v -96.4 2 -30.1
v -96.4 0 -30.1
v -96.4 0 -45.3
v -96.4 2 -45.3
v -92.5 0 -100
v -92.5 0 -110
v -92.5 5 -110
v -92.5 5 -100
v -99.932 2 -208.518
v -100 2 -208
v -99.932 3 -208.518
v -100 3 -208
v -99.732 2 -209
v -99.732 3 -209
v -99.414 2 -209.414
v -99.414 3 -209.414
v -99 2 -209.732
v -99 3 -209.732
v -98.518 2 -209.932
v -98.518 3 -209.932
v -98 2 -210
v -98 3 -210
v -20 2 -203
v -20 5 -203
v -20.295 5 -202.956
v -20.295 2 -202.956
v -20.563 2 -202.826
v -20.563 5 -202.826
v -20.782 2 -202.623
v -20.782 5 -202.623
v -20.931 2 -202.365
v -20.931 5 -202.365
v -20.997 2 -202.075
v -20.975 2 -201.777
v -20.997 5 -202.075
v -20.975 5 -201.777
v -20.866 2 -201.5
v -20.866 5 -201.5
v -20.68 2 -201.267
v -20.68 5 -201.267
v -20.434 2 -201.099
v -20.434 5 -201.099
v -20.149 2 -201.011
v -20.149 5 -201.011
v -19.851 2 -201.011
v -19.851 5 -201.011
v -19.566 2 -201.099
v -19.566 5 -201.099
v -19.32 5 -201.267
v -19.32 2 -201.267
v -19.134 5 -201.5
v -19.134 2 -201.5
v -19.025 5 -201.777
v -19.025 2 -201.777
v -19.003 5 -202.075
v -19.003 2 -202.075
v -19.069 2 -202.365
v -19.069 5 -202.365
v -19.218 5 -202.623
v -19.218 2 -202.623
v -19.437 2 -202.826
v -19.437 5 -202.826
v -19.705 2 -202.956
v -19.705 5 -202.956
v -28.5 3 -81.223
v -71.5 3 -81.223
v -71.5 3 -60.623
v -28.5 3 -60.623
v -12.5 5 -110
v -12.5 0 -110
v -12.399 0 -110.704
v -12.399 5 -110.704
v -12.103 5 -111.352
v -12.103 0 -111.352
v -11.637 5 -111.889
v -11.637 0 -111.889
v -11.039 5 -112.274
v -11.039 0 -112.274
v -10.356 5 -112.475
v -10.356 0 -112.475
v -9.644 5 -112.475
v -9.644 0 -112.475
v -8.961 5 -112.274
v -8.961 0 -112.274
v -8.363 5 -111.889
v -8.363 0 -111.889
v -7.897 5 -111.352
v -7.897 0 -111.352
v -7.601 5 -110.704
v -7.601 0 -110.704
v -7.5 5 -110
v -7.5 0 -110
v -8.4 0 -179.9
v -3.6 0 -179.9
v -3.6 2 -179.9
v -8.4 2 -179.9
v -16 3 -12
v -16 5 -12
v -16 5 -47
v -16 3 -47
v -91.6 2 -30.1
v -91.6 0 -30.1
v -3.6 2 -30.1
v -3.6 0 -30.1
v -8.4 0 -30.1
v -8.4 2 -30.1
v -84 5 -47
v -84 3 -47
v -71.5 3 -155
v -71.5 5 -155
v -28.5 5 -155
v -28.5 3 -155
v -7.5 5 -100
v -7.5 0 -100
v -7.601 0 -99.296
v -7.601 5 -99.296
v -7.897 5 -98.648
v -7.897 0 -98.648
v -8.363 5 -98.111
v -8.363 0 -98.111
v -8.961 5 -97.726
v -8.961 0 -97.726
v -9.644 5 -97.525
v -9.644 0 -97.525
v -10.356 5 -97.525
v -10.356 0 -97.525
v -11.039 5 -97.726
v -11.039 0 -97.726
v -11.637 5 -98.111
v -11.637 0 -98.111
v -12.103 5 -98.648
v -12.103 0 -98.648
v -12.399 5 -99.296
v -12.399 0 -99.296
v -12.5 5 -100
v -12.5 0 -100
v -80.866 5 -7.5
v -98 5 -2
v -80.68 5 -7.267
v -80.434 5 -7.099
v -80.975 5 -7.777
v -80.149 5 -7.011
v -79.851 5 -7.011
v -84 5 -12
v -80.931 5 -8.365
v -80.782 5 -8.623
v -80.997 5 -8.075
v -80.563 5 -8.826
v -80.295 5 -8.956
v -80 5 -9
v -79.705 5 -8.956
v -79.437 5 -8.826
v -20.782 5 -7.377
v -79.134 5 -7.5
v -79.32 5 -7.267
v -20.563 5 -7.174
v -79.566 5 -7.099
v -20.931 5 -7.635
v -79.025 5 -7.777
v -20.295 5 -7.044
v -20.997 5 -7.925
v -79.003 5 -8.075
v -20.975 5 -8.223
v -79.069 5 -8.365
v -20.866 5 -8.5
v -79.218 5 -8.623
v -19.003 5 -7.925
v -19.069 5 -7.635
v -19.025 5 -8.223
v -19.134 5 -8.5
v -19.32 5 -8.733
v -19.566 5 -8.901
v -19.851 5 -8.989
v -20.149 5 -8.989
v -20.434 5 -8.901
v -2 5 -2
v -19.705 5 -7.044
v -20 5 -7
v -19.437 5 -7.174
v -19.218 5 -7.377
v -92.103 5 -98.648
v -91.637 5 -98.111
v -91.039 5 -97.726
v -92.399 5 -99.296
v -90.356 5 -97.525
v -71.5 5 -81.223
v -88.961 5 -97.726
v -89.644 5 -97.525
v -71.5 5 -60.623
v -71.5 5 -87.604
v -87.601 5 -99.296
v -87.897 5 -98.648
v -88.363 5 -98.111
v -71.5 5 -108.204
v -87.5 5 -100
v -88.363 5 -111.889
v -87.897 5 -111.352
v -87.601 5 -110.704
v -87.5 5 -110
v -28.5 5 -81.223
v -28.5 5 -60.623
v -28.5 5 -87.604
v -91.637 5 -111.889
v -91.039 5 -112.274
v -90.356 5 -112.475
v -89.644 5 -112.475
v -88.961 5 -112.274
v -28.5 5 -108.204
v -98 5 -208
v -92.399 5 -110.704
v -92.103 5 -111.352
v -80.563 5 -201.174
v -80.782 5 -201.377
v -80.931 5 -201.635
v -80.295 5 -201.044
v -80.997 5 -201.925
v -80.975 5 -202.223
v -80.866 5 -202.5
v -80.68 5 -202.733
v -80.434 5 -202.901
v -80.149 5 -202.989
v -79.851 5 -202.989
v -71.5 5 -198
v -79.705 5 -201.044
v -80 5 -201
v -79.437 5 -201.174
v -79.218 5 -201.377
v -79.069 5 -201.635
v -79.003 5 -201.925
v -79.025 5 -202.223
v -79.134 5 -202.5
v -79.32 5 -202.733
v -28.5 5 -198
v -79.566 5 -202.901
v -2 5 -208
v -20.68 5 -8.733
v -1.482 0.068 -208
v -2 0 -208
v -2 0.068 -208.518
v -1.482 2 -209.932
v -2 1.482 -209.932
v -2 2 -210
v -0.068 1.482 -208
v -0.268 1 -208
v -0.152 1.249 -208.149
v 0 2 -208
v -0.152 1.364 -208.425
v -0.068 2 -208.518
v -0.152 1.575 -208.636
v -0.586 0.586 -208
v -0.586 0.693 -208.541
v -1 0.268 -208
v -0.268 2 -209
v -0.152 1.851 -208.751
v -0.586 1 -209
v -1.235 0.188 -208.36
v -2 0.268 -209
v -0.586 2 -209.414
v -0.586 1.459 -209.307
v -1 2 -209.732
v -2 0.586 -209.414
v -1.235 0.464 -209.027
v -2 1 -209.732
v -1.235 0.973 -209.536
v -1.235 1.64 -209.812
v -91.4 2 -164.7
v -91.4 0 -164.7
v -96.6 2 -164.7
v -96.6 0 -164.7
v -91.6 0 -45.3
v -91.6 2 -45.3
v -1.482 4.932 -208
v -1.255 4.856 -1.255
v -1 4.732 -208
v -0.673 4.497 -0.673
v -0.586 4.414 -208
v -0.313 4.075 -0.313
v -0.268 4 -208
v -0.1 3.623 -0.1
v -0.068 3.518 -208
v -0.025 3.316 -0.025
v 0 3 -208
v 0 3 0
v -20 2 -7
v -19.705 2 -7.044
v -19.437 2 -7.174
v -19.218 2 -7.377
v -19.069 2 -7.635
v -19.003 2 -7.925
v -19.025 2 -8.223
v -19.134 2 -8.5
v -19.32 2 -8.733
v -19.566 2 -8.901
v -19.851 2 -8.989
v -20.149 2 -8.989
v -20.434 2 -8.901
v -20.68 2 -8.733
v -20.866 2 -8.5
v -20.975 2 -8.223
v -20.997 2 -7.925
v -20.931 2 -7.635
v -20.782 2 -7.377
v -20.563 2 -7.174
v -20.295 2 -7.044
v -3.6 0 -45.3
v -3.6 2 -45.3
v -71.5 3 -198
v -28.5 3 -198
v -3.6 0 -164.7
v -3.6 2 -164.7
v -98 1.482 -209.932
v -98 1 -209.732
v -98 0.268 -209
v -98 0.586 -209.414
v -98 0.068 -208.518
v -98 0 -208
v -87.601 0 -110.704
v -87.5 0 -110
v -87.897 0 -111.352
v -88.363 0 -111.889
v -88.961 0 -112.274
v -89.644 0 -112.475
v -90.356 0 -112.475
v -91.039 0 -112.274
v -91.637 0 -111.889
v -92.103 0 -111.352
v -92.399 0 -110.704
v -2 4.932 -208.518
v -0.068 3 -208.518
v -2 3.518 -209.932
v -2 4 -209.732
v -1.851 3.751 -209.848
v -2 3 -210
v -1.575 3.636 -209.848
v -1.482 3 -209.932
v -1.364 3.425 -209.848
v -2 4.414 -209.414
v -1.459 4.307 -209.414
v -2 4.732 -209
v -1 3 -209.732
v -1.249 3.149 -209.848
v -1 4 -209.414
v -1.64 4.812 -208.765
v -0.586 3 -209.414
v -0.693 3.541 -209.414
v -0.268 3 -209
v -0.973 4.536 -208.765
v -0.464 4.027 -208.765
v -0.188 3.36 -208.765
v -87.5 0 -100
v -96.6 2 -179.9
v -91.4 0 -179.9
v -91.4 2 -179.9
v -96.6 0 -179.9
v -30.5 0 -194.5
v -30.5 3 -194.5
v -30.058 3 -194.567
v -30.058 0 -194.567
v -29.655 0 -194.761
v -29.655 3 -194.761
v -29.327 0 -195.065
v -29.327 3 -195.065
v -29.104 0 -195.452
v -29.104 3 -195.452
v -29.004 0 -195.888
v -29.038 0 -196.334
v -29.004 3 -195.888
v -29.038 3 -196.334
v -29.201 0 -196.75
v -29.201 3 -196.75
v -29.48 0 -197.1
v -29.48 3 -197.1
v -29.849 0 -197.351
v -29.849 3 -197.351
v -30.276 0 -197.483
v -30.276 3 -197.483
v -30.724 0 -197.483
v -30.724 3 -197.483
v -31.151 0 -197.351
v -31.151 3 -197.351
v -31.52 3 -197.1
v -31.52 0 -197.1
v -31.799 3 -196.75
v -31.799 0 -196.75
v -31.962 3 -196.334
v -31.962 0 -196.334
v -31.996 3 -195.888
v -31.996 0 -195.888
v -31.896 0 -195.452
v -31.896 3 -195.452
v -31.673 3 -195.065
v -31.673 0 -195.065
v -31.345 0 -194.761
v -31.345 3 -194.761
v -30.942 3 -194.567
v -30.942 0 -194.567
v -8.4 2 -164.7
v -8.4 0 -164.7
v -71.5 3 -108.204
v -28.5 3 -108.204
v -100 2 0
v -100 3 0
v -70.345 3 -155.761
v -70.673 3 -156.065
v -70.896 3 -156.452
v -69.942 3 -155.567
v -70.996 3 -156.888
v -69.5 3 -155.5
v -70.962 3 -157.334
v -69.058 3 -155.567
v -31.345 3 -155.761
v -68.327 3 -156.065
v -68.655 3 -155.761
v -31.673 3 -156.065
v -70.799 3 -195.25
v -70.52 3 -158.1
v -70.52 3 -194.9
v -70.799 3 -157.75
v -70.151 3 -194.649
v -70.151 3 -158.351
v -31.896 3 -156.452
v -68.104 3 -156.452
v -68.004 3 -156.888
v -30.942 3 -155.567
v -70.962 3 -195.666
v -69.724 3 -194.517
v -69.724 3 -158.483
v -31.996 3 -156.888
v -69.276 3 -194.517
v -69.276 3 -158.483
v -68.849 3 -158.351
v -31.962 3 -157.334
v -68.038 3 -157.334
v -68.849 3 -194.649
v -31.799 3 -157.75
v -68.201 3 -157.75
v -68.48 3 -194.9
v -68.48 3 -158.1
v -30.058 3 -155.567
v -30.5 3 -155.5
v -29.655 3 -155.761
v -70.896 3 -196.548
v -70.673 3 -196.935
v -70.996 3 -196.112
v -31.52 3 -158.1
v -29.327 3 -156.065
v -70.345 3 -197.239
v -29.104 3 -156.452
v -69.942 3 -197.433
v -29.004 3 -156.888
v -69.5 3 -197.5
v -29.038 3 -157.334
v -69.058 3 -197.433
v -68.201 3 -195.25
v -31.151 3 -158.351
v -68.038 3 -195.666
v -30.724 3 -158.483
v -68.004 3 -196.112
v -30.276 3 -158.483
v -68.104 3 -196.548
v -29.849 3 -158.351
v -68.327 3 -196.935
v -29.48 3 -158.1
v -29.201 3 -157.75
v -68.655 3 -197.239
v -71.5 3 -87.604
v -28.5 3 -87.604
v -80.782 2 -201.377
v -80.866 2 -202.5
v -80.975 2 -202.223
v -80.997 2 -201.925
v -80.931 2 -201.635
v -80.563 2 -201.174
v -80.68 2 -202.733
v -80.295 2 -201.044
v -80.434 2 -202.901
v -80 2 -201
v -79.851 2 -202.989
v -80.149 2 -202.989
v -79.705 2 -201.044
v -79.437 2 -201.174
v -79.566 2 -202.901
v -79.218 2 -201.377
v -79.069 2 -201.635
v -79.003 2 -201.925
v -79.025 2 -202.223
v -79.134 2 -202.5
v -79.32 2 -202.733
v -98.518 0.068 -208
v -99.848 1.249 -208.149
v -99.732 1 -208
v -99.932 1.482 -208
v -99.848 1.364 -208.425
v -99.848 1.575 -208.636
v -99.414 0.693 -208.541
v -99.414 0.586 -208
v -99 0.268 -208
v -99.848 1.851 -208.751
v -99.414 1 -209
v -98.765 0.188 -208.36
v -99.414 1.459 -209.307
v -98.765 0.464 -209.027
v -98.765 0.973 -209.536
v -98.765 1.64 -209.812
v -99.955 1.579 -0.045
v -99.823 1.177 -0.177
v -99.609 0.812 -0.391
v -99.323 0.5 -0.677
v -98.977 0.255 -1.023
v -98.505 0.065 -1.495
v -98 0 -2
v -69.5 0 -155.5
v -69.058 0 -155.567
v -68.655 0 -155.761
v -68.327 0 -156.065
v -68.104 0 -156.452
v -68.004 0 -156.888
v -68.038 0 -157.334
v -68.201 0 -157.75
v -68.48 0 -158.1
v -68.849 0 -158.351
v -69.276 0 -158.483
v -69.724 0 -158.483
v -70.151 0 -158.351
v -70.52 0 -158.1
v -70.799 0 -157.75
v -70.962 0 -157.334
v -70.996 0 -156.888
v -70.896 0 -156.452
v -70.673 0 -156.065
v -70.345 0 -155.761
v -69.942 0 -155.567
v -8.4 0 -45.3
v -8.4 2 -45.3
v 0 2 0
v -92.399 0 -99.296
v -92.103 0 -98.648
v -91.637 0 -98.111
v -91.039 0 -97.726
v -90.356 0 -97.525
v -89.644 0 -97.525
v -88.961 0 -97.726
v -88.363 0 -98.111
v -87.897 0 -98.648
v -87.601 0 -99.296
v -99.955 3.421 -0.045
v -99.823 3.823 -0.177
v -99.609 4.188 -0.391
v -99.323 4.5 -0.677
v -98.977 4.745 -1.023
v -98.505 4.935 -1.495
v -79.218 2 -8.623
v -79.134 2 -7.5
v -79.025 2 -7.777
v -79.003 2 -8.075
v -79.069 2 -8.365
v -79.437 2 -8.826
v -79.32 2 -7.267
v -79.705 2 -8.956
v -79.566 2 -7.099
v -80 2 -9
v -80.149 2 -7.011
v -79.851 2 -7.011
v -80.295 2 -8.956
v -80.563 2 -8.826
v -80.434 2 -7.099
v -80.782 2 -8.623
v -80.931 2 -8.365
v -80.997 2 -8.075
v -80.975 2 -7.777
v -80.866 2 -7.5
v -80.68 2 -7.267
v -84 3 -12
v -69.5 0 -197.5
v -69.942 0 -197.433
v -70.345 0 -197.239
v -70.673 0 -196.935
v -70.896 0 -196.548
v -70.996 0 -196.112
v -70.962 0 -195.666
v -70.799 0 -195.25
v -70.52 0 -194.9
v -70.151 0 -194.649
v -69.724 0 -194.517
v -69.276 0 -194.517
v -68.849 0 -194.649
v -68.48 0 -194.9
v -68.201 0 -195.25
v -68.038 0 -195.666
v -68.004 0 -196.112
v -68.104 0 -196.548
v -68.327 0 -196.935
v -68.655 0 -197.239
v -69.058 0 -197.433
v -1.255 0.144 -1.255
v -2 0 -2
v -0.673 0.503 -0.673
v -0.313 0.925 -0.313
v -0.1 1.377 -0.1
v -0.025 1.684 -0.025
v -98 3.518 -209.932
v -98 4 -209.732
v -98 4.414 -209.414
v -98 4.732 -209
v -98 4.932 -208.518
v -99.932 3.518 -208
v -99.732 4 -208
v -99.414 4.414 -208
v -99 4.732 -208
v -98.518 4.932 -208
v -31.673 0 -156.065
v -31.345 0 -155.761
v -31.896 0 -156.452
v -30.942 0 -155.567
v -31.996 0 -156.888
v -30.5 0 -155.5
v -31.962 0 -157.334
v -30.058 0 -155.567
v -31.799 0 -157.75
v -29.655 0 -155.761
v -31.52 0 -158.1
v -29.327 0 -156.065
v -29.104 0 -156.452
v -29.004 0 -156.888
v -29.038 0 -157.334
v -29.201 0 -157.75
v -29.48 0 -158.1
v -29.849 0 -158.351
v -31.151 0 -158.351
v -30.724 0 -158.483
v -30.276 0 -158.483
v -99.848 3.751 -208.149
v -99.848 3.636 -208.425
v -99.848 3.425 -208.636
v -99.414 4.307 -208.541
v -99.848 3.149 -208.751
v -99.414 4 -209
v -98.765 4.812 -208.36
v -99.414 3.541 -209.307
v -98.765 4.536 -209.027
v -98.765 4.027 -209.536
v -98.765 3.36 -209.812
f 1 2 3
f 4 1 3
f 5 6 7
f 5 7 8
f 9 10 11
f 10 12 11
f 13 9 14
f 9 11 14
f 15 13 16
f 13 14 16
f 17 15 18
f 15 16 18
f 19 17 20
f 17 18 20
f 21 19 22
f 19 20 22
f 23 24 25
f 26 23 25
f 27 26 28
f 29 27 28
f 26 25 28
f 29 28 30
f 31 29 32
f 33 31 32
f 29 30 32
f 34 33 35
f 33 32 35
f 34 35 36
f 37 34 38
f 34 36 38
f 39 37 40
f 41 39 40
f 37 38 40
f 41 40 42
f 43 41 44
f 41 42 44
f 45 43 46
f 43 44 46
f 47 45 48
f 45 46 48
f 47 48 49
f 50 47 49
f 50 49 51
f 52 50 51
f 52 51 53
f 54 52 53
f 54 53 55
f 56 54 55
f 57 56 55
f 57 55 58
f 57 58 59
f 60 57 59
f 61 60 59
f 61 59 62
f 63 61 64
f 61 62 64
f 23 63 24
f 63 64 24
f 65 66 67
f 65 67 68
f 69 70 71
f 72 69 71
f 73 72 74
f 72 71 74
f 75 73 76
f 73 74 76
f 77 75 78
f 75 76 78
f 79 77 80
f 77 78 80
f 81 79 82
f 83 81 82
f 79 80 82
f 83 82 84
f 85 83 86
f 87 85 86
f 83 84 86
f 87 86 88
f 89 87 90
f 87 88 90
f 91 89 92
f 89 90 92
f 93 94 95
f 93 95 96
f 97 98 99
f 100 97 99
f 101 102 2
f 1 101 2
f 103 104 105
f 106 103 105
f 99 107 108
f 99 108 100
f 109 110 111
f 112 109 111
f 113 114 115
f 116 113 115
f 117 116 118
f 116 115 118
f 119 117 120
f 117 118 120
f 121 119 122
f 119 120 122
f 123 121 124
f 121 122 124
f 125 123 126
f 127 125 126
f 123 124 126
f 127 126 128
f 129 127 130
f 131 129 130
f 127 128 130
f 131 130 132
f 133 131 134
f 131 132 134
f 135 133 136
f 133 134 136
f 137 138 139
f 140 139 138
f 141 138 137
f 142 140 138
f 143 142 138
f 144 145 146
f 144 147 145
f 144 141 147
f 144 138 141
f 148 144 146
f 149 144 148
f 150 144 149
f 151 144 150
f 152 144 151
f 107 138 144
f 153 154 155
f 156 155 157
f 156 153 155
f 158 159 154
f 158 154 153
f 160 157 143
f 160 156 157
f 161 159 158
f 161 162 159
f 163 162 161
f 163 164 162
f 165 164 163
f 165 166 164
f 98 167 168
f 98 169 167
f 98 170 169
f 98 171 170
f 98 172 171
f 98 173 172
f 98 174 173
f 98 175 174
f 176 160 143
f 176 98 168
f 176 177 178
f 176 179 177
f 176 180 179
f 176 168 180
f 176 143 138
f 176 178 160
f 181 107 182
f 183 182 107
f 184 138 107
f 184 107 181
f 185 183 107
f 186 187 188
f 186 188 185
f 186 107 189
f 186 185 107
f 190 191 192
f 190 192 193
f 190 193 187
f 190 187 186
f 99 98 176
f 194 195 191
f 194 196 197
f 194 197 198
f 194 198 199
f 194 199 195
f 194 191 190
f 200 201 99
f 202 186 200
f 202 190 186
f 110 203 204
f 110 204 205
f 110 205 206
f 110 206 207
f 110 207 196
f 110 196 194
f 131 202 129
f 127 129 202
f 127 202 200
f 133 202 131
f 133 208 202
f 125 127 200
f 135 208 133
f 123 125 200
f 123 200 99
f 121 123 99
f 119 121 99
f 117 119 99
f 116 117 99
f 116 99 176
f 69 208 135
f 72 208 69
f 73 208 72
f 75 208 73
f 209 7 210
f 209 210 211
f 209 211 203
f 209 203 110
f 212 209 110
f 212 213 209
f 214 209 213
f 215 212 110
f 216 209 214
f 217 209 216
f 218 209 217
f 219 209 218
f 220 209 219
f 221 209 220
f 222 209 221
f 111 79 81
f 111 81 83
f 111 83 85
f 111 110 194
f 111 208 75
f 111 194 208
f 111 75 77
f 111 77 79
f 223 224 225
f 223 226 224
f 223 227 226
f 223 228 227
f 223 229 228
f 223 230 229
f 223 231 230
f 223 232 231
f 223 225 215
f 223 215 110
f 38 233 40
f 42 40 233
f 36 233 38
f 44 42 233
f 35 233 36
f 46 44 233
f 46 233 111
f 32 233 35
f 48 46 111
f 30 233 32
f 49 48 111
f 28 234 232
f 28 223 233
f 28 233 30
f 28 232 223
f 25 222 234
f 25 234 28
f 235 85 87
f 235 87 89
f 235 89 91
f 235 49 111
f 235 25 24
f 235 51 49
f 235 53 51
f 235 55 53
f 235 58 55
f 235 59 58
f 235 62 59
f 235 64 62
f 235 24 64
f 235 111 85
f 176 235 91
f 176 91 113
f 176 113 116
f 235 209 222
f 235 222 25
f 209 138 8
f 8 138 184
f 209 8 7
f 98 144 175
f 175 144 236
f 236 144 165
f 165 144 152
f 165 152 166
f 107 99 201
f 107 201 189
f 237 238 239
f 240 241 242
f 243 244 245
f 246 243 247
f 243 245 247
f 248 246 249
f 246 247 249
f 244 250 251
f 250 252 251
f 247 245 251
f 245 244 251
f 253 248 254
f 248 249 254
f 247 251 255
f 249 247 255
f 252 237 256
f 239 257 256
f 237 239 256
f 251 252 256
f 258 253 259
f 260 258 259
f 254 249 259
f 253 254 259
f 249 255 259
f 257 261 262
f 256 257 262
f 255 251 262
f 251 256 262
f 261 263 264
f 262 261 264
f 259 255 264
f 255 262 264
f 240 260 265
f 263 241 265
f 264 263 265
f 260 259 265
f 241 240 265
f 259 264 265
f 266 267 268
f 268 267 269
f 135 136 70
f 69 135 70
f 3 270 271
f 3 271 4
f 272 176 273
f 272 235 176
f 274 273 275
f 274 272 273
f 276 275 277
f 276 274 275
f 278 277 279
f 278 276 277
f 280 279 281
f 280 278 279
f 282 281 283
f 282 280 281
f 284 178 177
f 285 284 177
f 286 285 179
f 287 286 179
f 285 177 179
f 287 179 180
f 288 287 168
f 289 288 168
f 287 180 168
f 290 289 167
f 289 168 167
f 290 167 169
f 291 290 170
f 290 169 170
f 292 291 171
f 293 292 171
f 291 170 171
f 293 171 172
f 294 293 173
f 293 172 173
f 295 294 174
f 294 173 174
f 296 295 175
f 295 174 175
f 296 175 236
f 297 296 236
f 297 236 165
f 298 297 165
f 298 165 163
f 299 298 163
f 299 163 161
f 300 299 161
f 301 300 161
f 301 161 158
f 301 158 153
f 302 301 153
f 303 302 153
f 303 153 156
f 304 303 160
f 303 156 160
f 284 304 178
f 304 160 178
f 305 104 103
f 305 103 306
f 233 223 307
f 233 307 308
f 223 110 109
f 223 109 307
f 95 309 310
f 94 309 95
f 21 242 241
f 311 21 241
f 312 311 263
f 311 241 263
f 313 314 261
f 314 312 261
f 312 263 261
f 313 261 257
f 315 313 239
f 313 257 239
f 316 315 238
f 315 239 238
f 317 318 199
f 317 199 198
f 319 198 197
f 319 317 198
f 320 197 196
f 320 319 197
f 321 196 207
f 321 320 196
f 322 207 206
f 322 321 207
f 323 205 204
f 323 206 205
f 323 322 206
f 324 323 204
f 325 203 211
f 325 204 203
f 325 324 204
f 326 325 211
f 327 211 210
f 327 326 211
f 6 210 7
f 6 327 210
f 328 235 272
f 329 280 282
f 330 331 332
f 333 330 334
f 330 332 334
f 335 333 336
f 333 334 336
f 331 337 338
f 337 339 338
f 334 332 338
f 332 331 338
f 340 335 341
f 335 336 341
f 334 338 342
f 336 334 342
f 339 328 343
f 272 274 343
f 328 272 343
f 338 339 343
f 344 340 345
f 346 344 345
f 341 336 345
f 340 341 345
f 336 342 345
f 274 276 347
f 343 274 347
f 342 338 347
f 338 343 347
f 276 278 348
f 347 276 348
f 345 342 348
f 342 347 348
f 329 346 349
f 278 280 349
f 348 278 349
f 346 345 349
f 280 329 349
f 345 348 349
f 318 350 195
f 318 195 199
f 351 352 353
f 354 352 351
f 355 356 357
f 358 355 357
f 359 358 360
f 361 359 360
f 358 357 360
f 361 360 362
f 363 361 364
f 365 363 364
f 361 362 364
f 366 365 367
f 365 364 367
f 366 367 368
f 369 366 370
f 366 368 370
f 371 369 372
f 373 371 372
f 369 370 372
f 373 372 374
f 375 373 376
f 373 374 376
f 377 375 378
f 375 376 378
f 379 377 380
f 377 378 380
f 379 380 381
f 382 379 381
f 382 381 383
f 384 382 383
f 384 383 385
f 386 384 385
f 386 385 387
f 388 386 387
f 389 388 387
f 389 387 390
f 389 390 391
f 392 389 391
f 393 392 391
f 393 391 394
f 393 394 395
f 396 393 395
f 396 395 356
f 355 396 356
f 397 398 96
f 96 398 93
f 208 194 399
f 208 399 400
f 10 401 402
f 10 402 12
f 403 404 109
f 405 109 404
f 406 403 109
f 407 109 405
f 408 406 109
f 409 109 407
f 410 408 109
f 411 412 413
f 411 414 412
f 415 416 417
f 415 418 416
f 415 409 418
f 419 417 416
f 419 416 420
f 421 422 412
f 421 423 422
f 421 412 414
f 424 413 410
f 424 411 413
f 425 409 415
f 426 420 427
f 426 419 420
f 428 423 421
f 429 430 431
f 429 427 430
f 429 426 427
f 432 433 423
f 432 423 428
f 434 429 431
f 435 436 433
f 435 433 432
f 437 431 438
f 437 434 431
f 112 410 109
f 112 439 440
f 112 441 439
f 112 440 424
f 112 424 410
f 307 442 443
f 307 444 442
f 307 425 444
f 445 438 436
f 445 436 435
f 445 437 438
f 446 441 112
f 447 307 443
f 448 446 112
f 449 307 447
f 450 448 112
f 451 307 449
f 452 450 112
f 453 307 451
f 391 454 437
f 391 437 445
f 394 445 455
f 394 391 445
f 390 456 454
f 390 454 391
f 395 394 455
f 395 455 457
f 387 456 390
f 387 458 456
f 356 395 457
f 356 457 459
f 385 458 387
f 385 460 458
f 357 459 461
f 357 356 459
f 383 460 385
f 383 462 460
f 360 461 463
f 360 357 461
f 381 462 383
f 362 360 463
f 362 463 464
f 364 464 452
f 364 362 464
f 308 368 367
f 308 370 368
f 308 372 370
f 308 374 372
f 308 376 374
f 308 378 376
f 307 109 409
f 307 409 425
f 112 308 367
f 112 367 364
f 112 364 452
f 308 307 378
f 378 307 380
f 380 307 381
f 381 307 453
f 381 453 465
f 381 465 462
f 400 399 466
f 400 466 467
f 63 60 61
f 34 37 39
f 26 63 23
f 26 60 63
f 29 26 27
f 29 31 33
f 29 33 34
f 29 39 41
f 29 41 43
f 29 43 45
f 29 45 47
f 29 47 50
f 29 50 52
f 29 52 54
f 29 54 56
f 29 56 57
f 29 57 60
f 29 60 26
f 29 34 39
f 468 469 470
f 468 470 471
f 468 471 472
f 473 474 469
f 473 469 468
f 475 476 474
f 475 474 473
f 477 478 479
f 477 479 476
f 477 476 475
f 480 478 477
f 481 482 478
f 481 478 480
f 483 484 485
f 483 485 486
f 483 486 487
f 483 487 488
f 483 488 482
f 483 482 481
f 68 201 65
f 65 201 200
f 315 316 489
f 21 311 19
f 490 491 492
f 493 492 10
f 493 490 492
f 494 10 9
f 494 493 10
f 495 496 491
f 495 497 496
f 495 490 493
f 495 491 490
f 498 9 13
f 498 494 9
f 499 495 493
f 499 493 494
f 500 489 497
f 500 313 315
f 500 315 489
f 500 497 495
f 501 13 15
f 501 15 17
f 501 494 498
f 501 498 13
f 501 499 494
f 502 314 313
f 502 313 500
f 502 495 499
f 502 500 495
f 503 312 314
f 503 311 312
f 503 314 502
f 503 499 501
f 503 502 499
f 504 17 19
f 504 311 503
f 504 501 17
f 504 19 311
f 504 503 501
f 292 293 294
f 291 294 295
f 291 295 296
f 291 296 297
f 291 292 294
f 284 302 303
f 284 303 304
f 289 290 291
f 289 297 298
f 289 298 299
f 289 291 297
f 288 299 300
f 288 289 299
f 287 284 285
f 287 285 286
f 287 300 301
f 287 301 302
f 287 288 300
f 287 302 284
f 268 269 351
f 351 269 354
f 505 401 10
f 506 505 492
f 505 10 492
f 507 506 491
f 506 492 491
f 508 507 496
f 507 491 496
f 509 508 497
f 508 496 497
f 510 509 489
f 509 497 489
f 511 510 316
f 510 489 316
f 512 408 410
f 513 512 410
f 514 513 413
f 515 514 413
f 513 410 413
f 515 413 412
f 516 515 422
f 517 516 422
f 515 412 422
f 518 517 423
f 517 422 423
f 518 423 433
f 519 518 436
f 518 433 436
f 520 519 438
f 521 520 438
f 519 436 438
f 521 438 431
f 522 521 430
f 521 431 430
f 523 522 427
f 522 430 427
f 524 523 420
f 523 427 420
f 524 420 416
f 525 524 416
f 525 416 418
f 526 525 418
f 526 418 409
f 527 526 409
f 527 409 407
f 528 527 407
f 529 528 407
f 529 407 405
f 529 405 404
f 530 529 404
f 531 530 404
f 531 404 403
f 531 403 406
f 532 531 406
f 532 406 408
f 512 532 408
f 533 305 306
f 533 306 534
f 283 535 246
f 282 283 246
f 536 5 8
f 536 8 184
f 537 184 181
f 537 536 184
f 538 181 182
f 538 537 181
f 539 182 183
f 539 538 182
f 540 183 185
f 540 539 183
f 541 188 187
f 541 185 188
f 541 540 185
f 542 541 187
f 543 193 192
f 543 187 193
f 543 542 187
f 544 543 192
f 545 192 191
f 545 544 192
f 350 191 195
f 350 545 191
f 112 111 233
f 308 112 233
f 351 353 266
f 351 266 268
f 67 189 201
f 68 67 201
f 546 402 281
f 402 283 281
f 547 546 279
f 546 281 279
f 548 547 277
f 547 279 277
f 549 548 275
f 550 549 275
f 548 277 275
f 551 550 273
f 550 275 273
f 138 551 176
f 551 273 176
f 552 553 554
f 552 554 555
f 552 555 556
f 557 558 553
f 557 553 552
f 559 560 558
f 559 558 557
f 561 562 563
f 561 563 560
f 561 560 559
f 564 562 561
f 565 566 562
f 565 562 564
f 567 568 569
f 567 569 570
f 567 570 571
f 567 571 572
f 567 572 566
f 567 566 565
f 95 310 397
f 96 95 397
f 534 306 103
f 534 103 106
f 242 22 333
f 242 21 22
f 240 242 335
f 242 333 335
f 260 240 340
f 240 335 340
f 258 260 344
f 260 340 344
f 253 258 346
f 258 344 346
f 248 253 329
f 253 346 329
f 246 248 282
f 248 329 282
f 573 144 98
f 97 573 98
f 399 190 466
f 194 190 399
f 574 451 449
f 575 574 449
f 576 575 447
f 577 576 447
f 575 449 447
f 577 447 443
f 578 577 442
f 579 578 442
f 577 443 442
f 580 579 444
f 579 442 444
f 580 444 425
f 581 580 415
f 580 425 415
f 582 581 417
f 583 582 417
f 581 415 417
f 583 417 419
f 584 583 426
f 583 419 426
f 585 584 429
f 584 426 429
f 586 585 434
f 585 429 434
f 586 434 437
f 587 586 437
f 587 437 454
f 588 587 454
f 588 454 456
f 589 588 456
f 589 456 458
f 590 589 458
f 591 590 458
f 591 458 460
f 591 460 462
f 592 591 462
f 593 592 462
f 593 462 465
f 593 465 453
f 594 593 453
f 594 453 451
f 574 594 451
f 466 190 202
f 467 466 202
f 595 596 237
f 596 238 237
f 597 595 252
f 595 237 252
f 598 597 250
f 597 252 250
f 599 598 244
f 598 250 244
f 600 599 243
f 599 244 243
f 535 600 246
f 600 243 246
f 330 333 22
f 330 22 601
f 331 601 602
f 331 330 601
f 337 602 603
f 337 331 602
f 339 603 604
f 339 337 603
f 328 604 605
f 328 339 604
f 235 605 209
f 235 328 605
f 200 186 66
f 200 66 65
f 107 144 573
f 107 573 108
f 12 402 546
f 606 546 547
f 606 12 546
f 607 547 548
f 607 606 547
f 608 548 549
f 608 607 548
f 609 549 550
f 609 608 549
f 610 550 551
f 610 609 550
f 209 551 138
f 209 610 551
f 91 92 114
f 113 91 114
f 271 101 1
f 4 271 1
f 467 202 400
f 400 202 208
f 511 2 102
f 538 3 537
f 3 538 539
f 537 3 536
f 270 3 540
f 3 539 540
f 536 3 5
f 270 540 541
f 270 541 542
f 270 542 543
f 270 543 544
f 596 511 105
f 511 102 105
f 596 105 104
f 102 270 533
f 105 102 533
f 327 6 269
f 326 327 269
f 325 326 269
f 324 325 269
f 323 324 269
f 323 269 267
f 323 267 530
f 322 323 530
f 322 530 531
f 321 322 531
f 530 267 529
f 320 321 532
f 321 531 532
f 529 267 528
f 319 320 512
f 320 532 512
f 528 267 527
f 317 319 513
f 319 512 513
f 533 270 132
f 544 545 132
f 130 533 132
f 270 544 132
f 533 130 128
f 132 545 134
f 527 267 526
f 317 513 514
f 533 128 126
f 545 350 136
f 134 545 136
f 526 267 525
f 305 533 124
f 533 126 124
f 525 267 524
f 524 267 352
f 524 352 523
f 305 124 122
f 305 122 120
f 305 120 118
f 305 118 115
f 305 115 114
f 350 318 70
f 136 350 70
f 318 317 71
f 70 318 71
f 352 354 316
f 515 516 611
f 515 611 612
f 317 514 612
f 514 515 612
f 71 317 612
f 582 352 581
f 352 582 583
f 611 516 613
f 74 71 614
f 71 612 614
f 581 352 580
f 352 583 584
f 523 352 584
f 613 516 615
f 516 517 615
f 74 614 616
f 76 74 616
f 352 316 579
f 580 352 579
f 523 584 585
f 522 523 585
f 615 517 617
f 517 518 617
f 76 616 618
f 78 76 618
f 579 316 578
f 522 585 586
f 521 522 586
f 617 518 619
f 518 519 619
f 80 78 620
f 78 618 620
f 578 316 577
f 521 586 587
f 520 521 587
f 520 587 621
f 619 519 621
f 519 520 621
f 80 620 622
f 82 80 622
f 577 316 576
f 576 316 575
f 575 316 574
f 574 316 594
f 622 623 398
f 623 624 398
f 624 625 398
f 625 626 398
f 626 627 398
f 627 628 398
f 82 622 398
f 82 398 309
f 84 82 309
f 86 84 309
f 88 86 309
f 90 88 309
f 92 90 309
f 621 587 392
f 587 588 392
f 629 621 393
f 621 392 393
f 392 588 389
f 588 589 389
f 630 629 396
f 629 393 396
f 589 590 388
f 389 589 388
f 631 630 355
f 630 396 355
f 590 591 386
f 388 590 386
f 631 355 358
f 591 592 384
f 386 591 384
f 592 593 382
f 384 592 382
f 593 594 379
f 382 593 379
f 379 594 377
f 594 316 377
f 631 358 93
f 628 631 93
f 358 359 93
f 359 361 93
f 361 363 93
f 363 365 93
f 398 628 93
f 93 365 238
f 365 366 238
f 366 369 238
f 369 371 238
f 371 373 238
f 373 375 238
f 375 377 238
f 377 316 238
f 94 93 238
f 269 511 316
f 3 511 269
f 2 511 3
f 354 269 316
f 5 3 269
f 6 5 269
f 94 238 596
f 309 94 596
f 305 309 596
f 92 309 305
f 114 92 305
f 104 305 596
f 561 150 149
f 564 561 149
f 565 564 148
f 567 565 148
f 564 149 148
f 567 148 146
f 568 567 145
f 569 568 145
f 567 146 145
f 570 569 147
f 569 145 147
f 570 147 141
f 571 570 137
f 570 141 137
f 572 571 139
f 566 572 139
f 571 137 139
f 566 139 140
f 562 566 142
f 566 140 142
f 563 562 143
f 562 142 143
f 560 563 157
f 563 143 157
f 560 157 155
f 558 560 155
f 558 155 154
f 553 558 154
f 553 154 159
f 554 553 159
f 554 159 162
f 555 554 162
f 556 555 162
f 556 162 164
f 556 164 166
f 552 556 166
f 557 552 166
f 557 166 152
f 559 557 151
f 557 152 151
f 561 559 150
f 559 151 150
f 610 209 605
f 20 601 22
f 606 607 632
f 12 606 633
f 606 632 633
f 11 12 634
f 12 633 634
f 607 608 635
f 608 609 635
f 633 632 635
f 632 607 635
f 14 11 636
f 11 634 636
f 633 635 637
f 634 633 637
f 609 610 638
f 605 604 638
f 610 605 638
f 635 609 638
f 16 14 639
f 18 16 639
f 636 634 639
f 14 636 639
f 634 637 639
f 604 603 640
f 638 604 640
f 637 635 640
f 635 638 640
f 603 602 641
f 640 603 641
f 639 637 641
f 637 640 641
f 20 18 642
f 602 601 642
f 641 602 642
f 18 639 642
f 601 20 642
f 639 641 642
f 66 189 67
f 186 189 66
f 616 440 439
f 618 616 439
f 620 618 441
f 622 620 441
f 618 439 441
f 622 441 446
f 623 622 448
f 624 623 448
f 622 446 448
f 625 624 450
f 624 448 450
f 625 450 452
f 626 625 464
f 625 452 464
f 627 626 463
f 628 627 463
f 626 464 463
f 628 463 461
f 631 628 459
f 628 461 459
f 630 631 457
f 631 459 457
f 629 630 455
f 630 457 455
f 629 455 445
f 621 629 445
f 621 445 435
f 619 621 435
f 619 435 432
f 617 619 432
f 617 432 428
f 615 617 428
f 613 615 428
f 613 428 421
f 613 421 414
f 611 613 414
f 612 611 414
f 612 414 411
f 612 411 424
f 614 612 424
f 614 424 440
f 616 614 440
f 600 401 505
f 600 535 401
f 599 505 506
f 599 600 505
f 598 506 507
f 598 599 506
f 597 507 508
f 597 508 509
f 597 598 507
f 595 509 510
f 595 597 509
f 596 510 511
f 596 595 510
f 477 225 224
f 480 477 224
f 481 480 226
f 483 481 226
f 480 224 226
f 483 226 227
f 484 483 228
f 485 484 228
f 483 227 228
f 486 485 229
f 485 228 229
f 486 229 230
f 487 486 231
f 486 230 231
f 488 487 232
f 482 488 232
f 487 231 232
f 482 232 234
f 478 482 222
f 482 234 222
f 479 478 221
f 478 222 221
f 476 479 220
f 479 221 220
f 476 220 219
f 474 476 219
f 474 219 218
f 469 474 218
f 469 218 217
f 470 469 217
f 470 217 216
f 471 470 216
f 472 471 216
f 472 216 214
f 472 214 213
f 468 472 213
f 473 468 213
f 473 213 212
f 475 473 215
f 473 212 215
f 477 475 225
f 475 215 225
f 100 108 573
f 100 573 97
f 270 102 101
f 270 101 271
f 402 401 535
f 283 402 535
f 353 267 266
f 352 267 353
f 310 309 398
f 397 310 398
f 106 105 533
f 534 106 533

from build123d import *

# Parameters (mm, degrees)
SKETCH3_W               = 100
SKETCH3_H               = 210
BOSS_EXTRUDE2_DEPTH     = 5
SKETCH2_W               = 4.8
SKETCH2_H               = 15.2
SKETCH2_W_2             = 5.2
CORTAR_EXTRUIR1_DEPTH   = 2
FILLET1_R               = 2
CUT_EXTRUDE1_DEPTH      = 233.647802483
CUT_EXTRUDE1_DEPTH_BACK = 233.647802483
SKETCH6_R               = 1
CUT_EXTRUDE2_DEPTH      = 3
SKETCH6_4_R             = 1.5
AGUJEROSL298N_DEPTH     = 233.647802483
SKETCH6_6_W             = 68
SKETCH6_6_H             = 35
SKETCH6_6_W_2           = 43
SKETCH6_6_H_2           = 43
SKETCH6_6_R             = 1.5
SKETCH6_6_H_3           = 20.6
CORTAR_EXTRUIR2_DEPTH   = 2


with BuildPart() as part:
    # Sketch3 → Boss-Extrude2 (new body)
    with BuildSketch(Plane(origin=(0, 0, 0), x_dir=(1, 0, 0), z_dir=(0, 1, 0))):
        with Locations((-50, 105)):
            Rectangle(SKETCH3_W, SKETCH3_H)
    extrude(amount=BOSS_EXTRUDE2_DEPTH)

    # Sketch2 → Cortar-Extruir1 (cut)
    with BuildSketch(Plane(origin=(0, 0, 0), x_dir=(-1, 0, 0), z_dir=(0, -1, 0))):
        with Locations((6, 172.3)):
            Rectangle(SKETCH2_W, SKETCH2_H)
        with Locations((94, 172.3)):
            Rectangle(SKETCH2_W_2, SKETCH2_H)
        with Locations((94, 37.7)):
            Rectangle(SKETCH2_W, SKETCH2_H)
        with Locations((6, 37.7)):
            Rectangle(SKETCH2_W, SKETCH2_H)
    extrude(amount=-CORTAR_EXTRUIR1_DEPTH, mode=Mode.SUBTRACT)

    # Fillet1
    fillet1_edges = [part.edges().sort_by_distance(p)[0] for p in [
        (-50, 5, -210),
        (-100, 5, -105),
        (0, 5, -105),
        (-50, 5, 0),
        (0, 2.5, -210),
        (-100, 2.5, -210),
        (-50, 0, -210),
        (-100, 0, -105),
        (-50, 0, 0),
        (0, 0, -105),
    ]]
    fillet(fillet1_edges, radius=FILLET1_R)

    # Sketch4 → Cut-Extrude1 (cut, two sides: drawn at the far end of the back side and taken through both)
    with BuildSketch(Plane(origin=(0, 5, 0), x_dir=(1, 0, 0), z_dir=(0, 1, 0)).offset(-CUT_EXTRUDE1_DEPTH_BACK)):
        with BuildLine():
            Line((-7.5, 110), (-7.5, 100))
            ThreePointArc((-7.5, 100), (-10, 97.5), (-12.5, 100))
            Line((-12.5, 100), (-12.5, 110))
            ThreePointArc((-12.5, 110), (-10, 112.5), (-7.5, 110))
        make_face()
        with BuildLine():
            Line((-92.5, 110), (-92.5, 100))
            ThreePointArc((-92.5, 100), (-90, 97.5), (-87.5, 100))
            Line((-87.5, 100), (-87.5, 110))
            ThreePointArc((-87.5, 110), (-90, 112.5), (-92.5, 110))
        make_face()
    extrude(amount=CUT_EXTRUDE1_DEPTH + CUT_EXTRUDE1_DEPTH_BACK, mode=Mode.SUBTRACT)

    # Sketch6 → Cut-Extrude2 (cut)
    with BuildSketch(Plane(origin=(0, 5, 0), x_dir=(1, 0, 0), z_dir=(0, 1, 0))):
        with Locations((-80, 202)):
            Circle(SKETCH6_R)
        with Locations((-20, 202)):
            Circle(SKETCH6_R)
        with Locations((-20, 8)):
            Circle(SKETCH6_R)
        with Locations((-80, 8)):
            Circle(SKETCH6_R)
    extrude(amount=-CUT_EXTRUDE2_DEPTH, mode=Mode.SUBTRACT)

    # Sketch6<4> → AgujerosL298N (cut, through all)
    with BuildSketch(Plane(origin=(0, 5, 0), x_dir=(1, 0, 0), z_dir=(0, 1, 0))):
        with Locations((-30.5, 196)):
            Circle(SKETCH6_4_R)
        with Locations((-30.5, 157)):
            Circle(SKETCH6_4_R)
        with Locations((-69.5, 157)):
            Circle(SKETCH6_4_R)
        with Locations((-69.5, 196)):
            Circle(SKETCH6_4_R)
    extrude(amount=-AGUJEROSL298N_DEPTH, mode=Mode.SUBTRACT)

    # Sketch6<6> → Cortar-Extruir2 (cut)
    # profile 1 of 4: a face of its own
    with BuildSketch(Plane(origin=(0, 5, 0), x_dir=(1, 0, 0), z_dir=(0, 1, 0))):
        with Locations((-50, 29.5)):
            Rectangle(SKETCH6_6_W, SKETCH6_6_H)
    # profile 2 of 4: a face of its own
    with BuildSketch(Plane(origin=(0, 5, 0), x_dir=(1, 0, 0), z_dir=(0, 1, 0))):
        with Locations((-50, 176.5)):
            Rectangle(SKETCH6_6_W_2, SKETCH6_6_H_2)
        with Locations((-69.5, 157)):
            Circle(SKETCH6_6_R, mode=Mode.SUBTRACT)
        with Locations((-30.5, 157)):
            Circle(SKETCH6_6_R, mode=Mode.SUBTRACT)
        with Locations((-69.5, 196)):
            Circle(SKETCH6_6_R, mode=Mode.SUBTRACT)
        with Locations((-30.5, 196)):
            Circle(SKETCH6_6_R, mode=Mode.SUBTRACT)
    # profile 3 of 4: a face of its own
    with BuildSketch(Plane(origin=(0, 5, 0), x_dir=(1, 0, 0), z_dir=(0, 1, 0))):
        with Locations((-50, 70.922705979)):
            Rectangle(SKETCH6_6_W_2, SKETCH6_6_H_3)
    # profile 4 of 4: a face of its own
    with BuildSketch(Plane(origin=(0, 5, 0), x_dir=(1, 0, 0), z_dir=(0, 1, 0))):
        with Locations((-50, 97.904338996)):
            Rectangle(SKETCH6_6_W_2, SKETCH6_6_H_3)
    extrude(amount=-CORTAR_EXTRUIR2_DEPTH, mode=Mode.SUBTRACT)


solid = part.part
